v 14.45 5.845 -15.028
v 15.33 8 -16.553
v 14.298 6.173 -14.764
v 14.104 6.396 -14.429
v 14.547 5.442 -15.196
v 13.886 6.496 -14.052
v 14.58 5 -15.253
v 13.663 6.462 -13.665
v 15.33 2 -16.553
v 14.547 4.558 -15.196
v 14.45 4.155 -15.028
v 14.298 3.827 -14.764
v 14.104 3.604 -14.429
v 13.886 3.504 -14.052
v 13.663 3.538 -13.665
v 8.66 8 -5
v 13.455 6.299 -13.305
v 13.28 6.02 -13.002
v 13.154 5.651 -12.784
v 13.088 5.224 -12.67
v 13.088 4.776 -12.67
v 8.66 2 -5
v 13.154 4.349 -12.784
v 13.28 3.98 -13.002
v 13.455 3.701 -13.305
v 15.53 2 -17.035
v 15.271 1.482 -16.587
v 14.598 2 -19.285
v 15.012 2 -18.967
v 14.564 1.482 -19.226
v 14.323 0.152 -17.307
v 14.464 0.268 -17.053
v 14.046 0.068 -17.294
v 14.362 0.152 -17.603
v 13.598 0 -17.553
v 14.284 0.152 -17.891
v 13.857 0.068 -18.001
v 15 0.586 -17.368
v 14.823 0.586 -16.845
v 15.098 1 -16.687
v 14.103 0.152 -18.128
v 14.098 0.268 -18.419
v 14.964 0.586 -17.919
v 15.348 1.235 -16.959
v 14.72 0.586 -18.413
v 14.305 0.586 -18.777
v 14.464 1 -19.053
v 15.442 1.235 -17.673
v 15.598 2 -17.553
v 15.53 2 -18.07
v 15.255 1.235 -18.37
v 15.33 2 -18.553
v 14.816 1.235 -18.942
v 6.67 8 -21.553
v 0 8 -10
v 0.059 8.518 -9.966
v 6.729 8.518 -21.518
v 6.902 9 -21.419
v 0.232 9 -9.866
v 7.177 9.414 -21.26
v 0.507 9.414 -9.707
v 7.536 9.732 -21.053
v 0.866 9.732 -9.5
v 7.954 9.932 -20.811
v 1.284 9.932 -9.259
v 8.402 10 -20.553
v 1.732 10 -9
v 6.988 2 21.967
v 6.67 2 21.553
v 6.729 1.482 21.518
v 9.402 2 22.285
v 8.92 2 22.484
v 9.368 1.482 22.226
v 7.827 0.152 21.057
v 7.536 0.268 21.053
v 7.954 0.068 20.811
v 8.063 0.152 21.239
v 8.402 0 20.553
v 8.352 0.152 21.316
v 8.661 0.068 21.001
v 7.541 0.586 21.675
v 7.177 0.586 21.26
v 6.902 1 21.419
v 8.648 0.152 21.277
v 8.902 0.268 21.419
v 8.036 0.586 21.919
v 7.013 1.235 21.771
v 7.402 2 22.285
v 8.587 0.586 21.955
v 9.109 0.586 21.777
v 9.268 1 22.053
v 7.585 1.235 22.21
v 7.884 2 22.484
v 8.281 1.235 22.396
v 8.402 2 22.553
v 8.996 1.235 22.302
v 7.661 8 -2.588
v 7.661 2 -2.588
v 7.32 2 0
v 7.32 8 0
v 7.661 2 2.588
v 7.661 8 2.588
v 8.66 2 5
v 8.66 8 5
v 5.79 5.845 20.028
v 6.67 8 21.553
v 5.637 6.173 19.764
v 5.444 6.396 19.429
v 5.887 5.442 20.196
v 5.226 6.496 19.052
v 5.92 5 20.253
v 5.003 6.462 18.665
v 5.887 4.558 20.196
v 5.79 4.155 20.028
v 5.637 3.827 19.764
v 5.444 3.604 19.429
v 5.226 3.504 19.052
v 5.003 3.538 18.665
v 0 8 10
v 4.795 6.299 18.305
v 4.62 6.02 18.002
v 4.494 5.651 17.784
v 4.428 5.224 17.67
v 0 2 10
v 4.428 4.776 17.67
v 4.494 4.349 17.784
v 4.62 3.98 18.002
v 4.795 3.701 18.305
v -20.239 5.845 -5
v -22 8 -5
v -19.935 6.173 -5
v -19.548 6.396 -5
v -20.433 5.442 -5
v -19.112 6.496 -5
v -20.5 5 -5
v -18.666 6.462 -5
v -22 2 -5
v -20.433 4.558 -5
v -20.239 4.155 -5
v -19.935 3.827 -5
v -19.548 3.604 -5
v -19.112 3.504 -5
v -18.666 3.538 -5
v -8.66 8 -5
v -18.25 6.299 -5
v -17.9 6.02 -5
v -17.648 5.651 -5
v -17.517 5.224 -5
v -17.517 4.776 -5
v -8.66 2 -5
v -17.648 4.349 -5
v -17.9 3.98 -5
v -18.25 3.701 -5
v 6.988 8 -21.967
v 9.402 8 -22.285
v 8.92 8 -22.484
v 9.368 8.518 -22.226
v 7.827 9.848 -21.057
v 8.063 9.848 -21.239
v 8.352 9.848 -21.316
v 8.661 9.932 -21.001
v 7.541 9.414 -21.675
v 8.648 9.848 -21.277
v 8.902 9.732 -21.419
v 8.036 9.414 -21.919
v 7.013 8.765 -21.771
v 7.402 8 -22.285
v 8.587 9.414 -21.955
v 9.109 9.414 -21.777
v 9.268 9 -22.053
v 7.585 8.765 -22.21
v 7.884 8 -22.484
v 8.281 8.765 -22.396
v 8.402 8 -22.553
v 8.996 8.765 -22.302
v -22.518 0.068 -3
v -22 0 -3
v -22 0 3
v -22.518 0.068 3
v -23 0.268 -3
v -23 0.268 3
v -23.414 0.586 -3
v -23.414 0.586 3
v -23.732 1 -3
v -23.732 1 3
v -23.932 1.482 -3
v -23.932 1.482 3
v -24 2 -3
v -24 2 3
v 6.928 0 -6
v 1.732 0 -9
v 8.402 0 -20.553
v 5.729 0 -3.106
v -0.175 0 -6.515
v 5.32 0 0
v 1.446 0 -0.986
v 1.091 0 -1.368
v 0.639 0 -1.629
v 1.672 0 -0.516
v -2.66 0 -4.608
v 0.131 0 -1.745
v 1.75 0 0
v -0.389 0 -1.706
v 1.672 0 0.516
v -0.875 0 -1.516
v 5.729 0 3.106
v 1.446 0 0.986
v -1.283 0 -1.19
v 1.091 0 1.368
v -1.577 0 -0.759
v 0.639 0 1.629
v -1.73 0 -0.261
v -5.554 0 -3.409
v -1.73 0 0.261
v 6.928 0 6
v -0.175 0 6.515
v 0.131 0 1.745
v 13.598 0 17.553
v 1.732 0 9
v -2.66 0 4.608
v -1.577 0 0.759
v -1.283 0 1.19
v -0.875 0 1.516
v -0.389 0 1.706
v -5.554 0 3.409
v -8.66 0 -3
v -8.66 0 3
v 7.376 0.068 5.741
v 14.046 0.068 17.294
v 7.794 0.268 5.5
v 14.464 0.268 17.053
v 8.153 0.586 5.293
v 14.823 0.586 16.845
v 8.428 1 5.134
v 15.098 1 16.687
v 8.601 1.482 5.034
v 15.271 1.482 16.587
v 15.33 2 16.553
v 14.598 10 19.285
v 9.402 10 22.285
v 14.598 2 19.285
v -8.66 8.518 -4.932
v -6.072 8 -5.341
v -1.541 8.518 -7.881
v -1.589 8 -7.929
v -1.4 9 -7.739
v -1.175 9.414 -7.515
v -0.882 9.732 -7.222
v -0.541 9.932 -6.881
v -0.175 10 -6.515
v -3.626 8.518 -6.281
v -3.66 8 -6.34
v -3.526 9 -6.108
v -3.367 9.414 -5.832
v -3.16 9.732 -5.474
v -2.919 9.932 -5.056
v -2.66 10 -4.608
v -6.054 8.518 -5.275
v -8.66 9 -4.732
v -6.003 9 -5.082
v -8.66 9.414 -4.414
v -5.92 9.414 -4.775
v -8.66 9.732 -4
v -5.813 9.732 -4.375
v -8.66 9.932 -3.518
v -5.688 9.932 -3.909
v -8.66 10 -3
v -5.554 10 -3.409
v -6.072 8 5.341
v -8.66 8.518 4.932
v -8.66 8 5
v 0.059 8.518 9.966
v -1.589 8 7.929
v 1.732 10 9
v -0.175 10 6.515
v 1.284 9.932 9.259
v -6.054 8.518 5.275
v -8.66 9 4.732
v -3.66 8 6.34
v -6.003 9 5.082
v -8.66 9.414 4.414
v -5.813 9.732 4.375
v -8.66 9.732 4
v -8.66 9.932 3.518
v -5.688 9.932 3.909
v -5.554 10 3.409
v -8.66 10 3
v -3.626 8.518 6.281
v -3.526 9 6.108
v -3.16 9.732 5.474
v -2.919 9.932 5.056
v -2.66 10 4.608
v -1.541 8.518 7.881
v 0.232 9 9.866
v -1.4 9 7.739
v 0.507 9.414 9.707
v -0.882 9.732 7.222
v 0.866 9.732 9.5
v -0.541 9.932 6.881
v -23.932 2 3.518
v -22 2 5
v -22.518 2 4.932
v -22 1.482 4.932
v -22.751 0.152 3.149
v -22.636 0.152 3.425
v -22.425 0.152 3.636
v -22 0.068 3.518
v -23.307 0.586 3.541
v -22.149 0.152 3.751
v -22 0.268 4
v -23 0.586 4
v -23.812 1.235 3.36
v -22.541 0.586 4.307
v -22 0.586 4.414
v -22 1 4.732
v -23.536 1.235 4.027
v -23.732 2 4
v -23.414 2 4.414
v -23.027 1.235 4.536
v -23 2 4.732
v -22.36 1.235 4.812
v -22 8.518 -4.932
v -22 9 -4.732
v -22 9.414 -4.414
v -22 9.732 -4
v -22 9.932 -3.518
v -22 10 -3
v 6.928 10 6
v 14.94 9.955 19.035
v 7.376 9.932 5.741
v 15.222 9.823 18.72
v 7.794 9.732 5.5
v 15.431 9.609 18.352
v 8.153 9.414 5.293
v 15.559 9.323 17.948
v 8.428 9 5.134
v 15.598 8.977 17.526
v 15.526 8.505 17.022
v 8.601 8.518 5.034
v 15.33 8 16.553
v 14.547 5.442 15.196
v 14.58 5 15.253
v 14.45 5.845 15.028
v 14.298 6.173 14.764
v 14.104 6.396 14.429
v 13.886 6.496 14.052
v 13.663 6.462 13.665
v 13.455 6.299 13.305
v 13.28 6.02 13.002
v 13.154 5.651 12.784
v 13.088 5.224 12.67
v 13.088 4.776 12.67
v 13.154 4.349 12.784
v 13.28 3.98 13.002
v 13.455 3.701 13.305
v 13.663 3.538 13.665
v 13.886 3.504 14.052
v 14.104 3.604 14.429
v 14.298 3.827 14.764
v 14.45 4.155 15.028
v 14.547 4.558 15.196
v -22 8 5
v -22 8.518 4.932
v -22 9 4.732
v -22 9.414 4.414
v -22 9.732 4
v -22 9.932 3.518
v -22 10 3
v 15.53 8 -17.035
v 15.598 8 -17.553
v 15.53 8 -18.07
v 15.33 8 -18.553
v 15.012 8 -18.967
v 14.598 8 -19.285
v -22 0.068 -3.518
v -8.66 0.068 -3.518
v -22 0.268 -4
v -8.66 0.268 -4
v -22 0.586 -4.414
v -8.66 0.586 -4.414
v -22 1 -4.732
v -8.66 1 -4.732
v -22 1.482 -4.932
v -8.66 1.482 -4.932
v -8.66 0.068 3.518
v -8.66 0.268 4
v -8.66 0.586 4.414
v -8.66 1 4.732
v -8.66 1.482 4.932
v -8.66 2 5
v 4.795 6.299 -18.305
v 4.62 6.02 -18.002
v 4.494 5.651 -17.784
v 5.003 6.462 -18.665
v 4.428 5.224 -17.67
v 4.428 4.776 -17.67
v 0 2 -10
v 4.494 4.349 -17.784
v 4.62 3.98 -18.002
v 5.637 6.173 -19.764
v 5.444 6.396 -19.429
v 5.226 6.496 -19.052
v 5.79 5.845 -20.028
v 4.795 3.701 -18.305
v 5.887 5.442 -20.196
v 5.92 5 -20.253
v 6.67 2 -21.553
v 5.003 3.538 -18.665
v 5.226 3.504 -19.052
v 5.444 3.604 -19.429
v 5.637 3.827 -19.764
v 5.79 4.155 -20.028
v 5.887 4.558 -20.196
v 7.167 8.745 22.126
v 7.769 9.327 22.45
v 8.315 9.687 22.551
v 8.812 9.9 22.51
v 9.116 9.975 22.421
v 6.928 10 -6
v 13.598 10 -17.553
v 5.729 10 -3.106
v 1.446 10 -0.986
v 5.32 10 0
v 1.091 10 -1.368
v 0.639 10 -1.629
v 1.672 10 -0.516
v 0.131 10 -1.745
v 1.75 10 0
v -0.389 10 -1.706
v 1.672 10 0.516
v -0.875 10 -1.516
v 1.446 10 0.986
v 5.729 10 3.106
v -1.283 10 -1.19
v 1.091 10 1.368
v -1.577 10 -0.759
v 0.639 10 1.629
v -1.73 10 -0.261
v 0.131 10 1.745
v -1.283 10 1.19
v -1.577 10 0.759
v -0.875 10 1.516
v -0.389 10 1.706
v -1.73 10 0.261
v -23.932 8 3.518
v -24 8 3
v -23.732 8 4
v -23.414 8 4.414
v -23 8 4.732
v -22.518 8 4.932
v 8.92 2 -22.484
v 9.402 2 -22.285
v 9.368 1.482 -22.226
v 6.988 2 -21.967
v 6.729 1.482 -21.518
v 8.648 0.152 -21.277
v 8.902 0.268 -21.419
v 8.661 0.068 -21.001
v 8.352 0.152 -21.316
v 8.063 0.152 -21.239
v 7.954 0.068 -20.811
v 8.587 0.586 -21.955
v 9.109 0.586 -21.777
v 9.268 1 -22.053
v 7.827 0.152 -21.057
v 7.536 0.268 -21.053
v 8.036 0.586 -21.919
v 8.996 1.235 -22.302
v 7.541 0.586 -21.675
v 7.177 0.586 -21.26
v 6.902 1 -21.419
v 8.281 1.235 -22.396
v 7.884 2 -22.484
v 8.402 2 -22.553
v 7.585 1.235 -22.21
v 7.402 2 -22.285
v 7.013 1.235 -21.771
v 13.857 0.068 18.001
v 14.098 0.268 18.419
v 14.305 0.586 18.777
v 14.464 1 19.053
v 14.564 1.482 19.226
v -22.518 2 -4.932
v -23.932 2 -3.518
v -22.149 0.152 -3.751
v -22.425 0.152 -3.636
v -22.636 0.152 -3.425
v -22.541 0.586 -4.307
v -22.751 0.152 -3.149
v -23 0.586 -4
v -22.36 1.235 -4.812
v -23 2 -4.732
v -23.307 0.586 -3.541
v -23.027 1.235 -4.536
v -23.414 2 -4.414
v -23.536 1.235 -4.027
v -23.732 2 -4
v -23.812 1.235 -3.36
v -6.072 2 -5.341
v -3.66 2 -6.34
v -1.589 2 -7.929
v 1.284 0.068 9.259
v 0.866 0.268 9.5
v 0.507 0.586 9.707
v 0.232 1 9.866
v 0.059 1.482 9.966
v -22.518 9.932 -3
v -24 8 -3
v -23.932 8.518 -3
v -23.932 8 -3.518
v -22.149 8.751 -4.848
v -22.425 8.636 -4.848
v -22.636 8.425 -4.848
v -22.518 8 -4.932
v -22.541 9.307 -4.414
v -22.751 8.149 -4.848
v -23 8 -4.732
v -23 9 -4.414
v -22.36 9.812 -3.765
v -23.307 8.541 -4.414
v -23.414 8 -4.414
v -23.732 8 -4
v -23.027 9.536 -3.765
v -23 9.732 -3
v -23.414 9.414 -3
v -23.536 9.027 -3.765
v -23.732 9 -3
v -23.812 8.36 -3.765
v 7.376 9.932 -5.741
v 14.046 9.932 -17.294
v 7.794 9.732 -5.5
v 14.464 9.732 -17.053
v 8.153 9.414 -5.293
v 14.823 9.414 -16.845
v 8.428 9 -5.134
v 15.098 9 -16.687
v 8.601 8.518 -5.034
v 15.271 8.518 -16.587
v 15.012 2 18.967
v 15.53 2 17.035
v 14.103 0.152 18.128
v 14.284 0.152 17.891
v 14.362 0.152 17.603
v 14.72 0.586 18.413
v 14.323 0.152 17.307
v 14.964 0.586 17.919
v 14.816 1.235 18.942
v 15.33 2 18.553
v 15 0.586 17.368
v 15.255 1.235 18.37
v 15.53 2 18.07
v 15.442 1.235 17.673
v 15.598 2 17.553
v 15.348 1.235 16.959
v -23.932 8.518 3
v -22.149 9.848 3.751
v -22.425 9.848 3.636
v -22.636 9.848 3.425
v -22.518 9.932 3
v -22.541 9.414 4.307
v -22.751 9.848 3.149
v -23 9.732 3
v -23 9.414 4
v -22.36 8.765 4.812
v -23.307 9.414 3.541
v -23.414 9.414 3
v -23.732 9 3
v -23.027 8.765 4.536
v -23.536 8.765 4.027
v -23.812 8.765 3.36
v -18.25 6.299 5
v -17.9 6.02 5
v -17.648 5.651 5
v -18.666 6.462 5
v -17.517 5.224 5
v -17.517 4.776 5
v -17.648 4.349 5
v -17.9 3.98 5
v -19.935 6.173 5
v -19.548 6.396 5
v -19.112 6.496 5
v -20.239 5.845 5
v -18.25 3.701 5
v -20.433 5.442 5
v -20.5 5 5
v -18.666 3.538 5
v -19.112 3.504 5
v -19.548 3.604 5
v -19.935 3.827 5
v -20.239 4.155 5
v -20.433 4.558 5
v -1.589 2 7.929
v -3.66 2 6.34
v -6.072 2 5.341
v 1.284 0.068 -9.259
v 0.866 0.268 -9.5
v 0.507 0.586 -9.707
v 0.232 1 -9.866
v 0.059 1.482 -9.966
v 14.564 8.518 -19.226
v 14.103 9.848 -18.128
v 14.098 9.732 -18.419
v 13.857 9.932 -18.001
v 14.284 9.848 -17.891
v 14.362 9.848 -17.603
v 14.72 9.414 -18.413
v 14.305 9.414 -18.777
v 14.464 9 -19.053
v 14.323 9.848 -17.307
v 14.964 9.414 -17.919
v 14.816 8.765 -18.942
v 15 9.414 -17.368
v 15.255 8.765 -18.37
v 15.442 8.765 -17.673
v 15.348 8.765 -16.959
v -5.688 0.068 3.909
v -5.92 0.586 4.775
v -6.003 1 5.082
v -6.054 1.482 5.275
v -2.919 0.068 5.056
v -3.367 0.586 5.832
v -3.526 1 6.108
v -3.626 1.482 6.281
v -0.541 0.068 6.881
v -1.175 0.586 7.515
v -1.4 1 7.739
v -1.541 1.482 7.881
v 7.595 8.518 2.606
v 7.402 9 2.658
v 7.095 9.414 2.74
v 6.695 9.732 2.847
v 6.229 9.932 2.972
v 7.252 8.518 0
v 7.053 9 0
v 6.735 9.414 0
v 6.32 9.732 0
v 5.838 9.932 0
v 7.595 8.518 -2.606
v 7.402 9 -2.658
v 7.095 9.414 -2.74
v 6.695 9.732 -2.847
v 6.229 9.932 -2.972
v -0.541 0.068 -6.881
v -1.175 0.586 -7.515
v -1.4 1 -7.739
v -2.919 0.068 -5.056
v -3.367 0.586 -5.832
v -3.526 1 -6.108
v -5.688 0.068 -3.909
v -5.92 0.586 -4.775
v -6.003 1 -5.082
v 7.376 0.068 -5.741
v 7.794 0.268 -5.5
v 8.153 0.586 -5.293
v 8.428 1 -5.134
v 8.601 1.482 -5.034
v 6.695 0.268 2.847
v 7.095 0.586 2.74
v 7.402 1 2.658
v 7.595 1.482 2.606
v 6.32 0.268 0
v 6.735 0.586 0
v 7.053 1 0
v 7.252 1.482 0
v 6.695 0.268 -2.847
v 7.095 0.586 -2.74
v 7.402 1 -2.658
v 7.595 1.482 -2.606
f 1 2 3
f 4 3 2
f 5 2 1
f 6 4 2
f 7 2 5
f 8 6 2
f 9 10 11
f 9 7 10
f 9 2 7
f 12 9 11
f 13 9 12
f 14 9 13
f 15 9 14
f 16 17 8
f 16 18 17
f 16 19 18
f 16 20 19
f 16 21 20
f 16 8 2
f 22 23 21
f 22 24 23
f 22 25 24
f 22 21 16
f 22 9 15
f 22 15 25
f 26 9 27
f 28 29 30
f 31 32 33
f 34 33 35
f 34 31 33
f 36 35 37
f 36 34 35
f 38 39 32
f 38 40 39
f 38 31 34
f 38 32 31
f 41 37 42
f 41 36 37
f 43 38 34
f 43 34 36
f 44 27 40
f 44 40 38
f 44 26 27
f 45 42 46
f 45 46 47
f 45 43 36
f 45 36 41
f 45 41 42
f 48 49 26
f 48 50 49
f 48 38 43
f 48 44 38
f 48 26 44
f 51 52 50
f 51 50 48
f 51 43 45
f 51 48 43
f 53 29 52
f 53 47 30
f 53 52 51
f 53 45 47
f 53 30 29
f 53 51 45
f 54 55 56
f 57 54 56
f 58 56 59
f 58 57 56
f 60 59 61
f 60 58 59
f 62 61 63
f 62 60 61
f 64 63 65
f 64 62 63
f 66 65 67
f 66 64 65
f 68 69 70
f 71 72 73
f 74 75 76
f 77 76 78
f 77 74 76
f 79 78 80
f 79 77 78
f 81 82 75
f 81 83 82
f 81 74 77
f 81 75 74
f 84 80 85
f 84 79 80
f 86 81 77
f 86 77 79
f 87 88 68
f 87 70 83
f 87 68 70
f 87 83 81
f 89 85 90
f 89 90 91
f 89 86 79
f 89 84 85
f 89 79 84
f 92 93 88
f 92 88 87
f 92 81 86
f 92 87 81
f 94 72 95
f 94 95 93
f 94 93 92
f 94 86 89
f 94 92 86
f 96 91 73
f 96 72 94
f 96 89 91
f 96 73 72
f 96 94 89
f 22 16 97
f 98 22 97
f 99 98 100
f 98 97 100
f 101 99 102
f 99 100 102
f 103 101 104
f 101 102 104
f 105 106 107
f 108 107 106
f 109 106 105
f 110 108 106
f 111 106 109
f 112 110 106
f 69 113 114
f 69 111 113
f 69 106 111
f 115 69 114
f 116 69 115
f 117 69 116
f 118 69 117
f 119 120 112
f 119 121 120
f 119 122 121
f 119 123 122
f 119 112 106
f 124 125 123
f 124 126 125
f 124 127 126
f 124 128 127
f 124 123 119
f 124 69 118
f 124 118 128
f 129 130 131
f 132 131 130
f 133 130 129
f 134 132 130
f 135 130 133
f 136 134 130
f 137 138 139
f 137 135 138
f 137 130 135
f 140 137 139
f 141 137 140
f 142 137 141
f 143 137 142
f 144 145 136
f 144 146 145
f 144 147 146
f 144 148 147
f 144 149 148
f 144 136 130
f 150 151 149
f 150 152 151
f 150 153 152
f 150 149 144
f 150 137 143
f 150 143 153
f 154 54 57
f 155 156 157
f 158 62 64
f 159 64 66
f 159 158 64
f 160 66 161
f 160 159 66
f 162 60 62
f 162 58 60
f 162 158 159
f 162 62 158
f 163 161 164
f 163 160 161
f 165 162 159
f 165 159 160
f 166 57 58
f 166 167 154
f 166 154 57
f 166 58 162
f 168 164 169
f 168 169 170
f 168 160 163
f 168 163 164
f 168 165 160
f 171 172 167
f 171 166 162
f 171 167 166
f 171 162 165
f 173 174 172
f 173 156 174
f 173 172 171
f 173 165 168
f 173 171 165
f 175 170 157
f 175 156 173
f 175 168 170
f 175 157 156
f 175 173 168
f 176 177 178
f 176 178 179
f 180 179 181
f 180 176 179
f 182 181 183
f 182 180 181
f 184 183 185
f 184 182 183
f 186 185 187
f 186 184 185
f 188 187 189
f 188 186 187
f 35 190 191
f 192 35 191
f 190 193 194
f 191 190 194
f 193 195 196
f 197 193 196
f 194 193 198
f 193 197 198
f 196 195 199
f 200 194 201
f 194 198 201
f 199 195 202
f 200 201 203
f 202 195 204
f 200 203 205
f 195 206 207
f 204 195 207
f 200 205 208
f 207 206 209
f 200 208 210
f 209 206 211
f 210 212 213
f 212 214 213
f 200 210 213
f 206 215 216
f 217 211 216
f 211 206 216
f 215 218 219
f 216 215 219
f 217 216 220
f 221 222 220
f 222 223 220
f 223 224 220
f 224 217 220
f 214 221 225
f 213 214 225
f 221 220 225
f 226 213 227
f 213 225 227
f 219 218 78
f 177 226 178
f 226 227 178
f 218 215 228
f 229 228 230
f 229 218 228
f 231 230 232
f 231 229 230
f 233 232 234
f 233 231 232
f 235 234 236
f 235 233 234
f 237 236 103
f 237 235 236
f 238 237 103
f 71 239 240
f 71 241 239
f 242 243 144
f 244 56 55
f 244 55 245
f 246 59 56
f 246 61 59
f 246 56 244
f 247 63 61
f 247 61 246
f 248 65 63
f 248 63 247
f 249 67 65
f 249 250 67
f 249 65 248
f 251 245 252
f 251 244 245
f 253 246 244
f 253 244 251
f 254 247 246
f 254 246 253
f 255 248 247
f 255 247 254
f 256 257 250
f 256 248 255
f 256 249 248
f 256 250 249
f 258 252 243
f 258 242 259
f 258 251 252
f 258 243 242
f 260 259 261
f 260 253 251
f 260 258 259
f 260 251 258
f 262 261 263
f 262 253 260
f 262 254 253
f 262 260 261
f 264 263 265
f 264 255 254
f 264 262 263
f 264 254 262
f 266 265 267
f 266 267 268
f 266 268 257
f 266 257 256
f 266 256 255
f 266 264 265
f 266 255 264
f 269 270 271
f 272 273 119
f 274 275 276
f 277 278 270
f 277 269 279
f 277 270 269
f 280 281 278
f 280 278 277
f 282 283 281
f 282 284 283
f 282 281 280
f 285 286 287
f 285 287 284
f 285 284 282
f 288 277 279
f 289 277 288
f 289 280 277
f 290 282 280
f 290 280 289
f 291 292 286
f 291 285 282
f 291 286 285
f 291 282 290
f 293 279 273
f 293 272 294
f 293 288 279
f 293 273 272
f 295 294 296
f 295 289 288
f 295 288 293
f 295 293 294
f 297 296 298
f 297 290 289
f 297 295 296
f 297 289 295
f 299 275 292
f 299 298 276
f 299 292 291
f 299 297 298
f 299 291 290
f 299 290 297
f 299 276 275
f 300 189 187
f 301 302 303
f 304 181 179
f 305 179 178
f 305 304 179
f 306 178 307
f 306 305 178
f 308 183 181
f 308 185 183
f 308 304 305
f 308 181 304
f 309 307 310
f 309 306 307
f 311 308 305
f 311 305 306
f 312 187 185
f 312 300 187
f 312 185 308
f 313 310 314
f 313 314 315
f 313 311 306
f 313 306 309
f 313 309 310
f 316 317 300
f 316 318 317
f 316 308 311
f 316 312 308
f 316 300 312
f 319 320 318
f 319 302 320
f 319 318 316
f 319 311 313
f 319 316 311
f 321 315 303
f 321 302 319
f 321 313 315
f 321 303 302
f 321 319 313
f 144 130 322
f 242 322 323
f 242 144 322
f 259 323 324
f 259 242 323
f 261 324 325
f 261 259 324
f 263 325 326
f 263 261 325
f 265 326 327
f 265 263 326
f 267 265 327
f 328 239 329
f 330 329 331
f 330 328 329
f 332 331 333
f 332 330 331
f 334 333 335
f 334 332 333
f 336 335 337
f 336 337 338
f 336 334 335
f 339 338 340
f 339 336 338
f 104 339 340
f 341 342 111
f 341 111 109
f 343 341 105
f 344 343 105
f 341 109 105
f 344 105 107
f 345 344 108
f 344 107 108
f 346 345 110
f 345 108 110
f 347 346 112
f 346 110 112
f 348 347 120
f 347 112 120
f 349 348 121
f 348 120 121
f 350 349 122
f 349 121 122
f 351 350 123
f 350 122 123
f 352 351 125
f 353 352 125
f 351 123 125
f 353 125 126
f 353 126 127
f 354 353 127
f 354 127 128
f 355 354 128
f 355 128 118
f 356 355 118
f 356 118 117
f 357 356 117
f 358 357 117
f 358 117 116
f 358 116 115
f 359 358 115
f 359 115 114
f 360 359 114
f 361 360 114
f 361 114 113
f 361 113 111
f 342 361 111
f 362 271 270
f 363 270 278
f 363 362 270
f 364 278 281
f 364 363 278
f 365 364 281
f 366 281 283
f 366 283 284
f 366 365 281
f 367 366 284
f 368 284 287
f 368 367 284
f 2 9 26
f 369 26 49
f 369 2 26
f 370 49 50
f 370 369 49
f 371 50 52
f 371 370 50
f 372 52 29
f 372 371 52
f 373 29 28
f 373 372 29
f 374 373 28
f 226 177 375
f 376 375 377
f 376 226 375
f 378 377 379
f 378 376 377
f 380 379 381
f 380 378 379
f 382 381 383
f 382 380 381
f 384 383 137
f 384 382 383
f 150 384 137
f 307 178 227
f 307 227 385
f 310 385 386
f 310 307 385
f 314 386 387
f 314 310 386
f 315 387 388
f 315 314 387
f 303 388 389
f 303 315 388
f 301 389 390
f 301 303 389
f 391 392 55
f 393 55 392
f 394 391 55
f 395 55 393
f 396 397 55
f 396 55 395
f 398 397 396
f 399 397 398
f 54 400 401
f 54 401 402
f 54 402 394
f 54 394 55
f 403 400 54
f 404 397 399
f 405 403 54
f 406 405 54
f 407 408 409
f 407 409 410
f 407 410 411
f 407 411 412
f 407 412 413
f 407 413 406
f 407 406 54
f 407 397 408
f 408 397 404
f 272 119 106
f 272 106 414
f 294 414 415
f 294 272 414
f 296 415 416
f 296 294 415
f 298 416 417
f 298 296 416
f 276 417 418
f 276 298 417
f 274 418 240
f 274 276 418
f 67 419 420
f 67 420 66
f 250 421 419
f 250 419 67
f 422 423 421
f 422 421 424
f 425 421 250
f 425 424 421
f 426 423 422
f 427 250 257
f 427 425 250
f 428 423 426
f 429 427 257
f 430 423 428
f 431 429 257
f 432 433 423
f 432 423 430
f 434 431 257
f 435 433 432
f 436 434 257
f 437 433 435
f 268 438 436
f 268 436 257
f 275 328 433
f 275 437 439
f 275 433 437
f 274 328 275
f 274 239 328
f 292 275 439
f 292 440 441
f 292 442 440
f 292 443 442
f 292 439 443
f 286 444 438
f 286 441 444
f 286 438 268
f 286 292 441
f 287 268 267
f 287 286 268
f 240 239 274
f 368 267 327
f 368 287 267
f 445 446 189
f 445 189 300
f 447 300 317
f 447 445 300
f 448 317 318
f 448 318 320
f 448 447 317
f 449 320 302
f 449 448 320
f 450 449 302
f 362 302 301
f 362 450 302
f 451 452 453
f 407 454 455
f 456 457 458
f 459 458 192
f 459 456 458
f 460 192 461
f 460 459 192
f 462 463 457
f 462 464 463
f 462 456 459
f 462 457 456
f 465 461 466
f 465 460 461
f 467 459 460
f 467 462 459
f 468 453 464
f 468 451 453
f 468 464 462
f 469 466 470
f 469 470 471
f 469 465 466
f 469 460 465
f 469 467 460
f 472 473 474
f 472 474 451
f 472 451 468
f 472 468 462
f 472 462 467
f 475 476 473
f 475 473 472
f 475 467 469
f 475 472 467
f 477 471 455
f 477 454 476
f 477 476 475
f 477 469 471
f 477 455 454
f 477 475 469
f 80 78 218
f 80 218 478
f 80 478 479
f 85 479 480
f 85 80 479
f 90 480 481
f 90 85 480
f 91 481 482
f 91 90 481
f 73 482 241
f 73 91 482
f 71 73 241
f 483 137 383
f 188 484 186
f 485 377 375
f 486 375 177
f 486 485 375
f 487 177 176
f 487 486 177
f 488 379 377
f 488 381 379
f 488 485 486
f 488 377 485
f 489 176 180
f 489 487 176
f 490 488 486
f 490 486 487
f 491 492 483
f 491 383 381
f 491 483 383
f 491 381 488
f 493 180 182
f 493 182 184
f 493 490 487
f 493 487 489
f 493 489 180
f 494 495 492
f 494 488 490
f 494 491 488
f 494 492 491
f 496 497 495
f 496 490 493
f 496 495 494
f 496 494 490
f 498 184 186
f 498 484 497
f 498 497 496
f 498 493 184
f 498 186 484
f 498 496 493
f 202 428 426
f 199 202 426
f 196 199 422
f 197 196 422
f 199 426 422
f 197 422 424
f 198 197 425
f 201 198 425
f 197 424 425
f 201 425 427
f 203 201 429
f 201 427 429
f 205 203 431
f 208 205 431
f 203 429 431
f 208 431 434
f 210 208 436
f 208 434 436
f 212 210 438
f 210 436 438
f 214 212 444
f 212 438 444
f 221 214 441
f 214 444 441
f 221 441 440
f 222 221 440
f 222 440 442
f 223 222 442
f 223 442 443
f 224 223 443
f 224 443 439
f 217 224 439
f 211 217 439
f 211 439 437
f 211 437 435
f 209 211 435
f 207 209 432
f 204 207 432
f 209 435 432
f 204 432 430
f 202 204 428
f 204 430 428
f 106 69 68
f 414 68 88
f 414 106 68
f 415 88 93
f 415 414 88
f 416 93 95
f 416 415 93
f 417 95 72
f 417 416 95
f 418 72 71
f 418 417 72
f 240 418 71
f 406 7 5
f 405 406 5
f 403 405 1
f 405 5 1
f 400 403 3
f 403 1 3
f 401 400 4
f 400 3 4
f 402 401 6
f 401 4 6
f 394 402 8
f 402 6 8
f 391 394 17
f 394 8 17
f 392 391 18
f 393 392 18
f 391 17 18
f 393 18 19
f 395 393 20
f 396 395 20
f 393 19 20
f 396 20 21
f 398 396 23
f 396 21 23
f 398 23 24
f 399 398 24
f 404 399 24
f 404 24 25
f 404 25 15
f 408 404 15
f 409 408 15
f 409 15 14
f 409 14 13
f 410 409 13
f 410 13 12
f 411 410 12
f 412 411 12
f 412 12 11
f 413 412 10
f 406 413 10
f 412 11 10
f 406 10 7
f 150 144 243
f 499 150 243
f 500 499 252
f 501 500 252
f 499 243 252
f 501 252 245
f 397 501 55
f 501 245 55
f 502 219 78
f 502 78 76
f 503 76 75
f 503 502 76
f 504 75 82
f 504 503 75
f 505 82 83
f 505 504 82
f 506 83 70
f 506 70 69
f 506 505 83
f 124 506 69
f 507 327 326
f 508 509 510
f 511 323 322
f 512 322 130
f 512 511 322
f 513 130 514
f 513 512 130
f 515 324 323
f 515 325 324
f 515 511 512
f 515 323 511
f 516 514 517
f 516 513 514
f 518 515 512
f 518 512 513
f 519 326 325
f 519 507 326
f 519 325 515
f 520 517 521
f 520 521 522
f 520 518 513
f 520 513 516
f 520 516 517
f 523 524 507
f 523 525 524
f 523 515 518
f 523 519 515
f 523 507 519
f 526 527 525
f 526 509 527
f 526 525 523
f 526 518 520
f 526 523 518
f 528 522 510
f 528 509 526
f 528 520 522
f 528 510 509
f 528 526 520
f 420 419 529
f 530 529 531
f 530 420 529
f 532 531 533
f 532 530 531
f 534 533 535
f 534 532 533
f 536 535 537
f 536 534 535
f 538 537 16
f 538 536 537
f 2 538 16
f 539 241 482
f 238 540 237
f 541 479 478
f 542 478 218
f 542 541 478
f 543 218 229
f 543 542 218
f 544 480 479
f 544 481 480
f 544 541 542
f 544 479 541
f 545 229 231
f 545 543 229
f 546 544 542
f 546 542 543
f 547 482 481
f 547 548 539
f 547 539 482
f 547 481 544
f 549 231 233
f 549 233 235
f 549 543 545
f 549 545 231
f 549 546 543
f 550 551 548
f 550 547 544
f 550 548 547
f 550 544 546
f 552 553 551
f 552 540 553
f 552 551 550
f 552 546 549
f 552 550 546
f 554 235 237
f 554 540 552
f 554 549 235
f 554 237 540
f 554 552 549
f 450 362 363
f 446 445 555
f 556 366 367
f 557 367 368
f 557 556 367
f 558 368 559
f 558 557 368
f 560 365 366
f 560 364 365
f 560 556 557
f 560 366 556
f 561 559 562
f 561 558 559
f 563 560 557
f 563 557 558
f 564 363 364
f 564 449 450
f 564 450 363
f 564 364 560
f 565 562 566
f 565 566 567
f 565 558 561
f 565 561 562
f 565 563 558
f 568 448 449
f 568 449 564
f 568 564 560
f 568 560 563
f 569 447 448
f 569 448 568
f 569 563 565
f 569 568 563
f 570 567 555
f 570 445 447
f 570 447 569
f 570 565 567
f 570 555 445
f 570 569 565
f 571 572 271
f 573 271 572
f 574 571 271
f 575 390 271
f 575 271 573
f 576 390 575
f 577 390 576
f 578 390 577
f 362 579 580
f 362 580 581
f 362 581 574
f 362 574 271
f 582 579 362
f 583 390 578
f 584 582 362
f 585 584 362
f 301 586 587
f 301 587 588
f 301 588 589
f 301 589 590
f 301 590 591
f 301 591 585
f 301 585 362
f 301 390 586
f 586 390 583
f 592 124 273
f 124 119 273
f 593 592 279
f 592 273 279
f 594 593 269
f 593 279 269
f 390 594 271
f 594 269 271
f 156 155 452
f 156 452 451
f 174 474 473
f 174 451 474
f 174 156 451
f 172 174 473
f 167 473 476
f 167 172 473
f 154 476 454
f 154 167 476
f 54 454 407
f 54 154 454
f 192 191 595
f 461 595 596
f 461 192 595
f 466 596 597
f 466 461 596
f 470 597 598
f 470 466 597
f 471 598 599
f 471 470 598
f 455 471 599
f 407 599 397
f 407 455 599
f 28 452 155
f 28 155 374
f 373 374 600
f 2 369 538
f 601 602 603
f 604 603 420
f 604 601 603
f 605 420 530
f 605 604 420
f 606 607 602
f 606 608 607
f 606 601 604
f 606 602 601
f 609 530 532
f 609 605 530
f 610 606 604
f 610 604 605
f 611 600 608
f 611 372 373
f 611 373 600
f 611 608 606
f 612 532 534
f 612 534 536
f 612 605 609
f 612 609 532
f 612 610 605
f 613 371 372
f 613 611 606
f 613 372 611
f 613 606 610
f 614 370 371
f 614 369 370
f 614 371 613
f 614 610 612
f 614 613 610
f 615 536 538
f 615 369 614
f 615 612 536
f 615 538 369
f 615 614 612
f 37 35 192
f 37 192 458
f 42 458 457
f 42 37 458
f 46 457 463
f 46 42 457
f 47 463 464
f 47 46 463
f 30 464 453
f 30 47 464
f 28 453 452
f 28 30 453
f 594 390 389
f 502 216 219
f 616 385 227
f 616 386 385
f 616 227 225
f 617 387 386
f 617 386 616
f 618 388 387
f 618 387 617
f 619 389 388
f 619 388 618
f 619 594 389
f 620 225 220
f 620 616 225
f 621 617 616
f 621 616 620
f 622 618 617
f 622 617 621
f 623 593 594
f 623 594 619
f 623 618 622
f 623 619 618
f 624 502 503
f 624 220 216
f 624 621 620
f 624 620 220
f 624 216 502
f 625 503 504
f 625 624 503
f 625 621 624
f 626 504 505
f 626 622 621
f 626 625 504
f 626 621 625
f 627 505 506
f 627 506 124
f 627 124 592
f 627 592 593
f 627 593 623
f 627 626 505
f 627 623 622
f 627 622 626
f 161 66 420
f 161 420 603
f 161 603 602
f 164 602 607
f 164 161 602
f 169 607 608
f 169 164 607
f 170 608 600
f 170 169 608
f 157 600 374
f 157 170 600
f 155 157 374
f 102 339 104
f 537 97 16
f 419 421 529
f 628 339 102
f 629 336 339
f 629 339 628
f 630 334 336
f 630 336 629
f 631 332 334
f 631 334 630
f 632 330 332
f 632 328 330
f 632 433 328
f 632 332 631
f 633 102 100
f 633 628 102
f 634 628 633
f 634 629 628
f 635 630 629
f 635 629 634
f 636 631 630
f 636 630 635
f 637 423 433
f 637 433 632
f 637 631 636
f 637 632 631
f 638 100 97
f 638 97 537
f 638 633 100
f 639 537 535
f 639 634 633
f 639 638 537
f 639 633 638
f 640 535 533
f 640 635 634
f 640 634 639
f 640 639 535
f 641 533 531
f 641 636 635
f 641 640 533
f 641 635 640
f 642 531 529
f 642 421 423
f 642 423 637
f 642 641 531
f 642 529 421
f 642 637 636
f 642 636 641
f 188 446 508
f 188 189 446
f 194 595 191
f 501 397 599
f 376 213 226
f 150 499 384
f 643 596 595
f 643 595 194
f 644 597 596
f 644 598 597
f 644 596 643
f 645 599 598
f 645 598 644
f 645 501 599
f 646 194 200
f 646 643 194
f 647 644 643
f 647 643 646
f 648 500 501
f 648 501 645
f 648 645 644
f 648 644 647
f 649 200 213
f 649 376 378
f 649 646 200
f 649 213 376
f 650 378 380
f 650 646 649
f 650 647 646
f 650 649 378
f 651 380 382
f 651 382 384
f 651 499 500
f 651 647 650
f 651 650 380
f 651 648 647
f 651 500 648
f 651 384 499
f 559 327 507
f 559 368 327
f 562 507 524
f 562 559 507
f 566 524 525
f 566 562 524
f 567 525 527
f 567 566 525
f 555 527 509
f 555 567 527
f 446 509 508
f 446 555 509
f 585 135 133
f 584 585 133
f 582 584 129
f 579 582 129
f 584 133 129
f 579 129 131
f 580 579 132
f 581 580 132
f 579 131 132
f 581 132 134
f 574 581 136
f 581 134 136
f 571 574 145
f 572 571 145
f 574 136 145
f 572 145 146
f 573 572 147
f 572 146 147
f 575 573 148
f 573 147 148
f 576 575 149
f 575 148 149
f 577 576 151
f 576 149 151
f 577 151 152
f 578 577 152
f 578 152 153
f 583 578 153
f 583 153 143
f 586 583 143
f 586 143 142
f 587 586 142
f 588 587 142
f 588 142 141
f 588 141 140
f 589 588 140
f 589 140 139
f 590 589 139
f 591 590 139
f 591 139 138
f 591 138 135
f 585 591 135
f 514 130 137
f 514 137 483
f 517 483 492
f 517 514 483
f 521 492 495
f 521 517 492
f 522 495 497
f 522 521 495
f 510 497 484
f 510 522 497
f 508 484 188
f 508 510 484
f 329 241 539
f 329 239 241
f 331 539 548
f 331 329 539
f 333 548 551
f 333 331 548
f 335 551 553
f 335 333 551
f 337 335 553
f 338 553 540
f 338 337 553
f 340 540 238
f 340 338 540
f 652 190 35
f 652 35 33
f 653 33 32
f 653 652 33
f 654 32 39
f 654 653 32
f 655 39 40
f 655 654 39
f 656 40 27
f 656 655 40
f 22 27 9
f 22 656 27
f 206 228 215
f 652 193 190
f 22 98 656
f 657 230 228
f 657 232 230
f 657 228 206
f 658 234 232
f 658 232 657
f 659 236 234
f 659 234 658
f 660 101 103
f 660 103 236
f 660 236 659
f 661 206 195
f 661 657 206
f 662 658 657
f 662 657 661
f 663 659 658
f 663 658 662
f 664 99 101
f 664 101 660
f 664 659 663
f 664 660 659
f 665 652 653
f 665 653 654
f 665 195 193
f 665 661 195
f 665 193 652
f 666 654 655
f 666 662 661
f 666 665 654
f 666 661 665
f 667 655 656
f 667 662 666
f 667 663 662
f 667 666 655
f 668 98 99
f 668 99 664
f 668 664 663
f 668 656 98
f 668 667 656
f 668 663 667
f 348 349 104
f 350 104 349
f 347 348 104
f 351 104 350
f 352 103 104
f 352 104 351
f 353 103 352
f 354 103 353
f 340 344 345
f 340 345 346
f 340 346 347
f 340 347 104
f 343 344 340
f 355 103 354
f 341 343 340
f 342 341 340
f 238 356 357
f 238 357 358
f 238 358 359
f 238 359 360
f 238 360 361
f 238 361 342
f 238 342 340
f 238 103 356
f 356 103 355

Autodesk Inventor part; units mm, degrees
ref_plane "YZ Plane" through (0, 0, 0) normal (1, 0, 0) x (0, 1, 0)
ref_plane "XZ Plane" through (0, 0, 0) normal (0, 1, 0) x (-1, 0, 0)
ref_plane "XY Plane" through (0, 0, 0) normal (0, 0, 1) x (1, 0, 0)
sketch "Sketch5" plane through (0, 0, 0) normal (0, 1, 0) x (-1, 0, 0)
  circle A0 centre (0, 0) radius 1.75
  circle A1 centre (0, 0) radius 24
  line L0 (0, 0) -> (24, 0)
  line L1 (24, 0) -> (29, 0)
  line L2 (24, 0) -> (24, -5)
  line L3 (24, 0) -> (29, 0) construction
  line L4 (24, -5) -> (0, -5)
  line L5 (0, -5) -> (0, 5)
  line L6 (0, 5) -> (24, 5)
  line L7 (24, 5) -> (24, -5)
  line L8 (-7.6699, 23.2846) -> (4.3301, 2.5)
  line L9 (-4.3301, -2.5) -> (-16.3301, 18.2846)
  line L10 (4.3301, 2.5) -> (-4.3301, -2.5)
  line L11 (-12, 20.7846) -> (-7.6699, 23.2846)
  line L12 (-16.3301, 18.2846) -> (-7.6699, 23.2846)
  line L13 (-16.3301, -18.2846) -> (-4.3301, 2.5)
  line L14 (4.3301, -2.5) -> (-7.6699, -23.2846)
  line L15 (-4.3301, 2.5) -> (4.3301, -2.5)
  line L16 (-12, -20.7846) -> (-16.3301, -18.2846)
  line L17 (-7.6699, -23.2846) -> (-16.3301, -18.2846)
  dimension "d78" = 48
  dimension "d54" = 3.5
  dimension "d82" = 5
  dimension "d83" = 5
  dimension "d84" = 90
  dimension "d85" = 24
  dimension "d86" = 10
  dimension "d89" = 360
extrude "Extrusion7" add sketch "Sketch5" along normal blind 10 contours L0 L10 A0 | L0 A1 L4 L14 L15 A0 | A0 L15 L0 | A0 L10 L8 L6 A1 L0 | L10 L5 A0 | A0 L5 L6 L8 L10 | L15 L14 L4 L5 A0 | A0 L5 L15 | L15 A0 L5 | L5 A0 L10 | L10 A0 L15 | L2 L4 A1 | A1 L6 L7 | A0 L15 L13 L9 A1 L8 L6 L5 | L5 L4 L14 A1 L13 L9 L10 A0 | L10 L9 L13 L15 A0 | A1 L11 L8 | L14 L17 A1 | A1 L9 L12 | L16 L13 A1
sketch "Sketch7" plane through (5.7735, 0, 0) normal (0.866, 0, 0.5) x (0.5, 0, -0.866)
  line L0 (21.1132, 0) -> (21.1132, 10) projected
  line L1 (21.1132, 10) -> (21.1132, 5)
  line L2 (21.1132, 5) -> (16.1132, 5)
  circle A0 centre (16.1132, 5) radius 1.5
  point P0 (-2.8868, 0)
  dimension "d93" = 5
  dimension "d94" = 5
  dimension "d95" = 3
extrude "Extrusion8" cut sketch "Sketch7" against normal blind 10
sketch "Sketch8" plane through (0, 10, 0) normal (0, 1, 0) x (1, 0, 0)
  circle A0 centre (0, 0) radius 1.75
  dimension "d98" = 3.5
extrude "Extrusion9" cut sketch "Sketch8" against normal blind 10
pattern_circular "Circular Pattern7" count 3 over 360 about axis through (0, 10, 0) along (0, -1, 0) of "Extrusion8"
fillet "Fillet7" radius 10 3 edges at (5.7735, 5, 0) (-2.8868, 5, 5) (-2.8868, 5, -5)
fillet "Fillet8" radius 2 23 edges at (7.6699, 5, 23.2846) (16.3301, 5, 18.2846) (-24, 5, 5) (-24, 10, 0) (16.3301, 5, -18.2846) (12, 10, -20.7846) (7.6699, 5, -23.2846) (-16.3301, 10, -5) (3.8349, 10, -16.6423) (12.4952, 10, 11.6423) (12.4952, 10, -11.6423) (-16.3301, 10, 5) (3.8349, 10, 16.6423) (-24, 5, -5) (-24, 0, 0) (12, 0, 20.7846) (12.4952, 0, -11.6423) (12.4952, 0, 11.6423) (-16.3301, 0, 5) (3.8349, 0, 16.6423) (-16.3301, 0, -5) (3.8349, 0, -16.6423) (12, 0, -20.7846)
properties part number "Custom_Delta_End_Effector"
